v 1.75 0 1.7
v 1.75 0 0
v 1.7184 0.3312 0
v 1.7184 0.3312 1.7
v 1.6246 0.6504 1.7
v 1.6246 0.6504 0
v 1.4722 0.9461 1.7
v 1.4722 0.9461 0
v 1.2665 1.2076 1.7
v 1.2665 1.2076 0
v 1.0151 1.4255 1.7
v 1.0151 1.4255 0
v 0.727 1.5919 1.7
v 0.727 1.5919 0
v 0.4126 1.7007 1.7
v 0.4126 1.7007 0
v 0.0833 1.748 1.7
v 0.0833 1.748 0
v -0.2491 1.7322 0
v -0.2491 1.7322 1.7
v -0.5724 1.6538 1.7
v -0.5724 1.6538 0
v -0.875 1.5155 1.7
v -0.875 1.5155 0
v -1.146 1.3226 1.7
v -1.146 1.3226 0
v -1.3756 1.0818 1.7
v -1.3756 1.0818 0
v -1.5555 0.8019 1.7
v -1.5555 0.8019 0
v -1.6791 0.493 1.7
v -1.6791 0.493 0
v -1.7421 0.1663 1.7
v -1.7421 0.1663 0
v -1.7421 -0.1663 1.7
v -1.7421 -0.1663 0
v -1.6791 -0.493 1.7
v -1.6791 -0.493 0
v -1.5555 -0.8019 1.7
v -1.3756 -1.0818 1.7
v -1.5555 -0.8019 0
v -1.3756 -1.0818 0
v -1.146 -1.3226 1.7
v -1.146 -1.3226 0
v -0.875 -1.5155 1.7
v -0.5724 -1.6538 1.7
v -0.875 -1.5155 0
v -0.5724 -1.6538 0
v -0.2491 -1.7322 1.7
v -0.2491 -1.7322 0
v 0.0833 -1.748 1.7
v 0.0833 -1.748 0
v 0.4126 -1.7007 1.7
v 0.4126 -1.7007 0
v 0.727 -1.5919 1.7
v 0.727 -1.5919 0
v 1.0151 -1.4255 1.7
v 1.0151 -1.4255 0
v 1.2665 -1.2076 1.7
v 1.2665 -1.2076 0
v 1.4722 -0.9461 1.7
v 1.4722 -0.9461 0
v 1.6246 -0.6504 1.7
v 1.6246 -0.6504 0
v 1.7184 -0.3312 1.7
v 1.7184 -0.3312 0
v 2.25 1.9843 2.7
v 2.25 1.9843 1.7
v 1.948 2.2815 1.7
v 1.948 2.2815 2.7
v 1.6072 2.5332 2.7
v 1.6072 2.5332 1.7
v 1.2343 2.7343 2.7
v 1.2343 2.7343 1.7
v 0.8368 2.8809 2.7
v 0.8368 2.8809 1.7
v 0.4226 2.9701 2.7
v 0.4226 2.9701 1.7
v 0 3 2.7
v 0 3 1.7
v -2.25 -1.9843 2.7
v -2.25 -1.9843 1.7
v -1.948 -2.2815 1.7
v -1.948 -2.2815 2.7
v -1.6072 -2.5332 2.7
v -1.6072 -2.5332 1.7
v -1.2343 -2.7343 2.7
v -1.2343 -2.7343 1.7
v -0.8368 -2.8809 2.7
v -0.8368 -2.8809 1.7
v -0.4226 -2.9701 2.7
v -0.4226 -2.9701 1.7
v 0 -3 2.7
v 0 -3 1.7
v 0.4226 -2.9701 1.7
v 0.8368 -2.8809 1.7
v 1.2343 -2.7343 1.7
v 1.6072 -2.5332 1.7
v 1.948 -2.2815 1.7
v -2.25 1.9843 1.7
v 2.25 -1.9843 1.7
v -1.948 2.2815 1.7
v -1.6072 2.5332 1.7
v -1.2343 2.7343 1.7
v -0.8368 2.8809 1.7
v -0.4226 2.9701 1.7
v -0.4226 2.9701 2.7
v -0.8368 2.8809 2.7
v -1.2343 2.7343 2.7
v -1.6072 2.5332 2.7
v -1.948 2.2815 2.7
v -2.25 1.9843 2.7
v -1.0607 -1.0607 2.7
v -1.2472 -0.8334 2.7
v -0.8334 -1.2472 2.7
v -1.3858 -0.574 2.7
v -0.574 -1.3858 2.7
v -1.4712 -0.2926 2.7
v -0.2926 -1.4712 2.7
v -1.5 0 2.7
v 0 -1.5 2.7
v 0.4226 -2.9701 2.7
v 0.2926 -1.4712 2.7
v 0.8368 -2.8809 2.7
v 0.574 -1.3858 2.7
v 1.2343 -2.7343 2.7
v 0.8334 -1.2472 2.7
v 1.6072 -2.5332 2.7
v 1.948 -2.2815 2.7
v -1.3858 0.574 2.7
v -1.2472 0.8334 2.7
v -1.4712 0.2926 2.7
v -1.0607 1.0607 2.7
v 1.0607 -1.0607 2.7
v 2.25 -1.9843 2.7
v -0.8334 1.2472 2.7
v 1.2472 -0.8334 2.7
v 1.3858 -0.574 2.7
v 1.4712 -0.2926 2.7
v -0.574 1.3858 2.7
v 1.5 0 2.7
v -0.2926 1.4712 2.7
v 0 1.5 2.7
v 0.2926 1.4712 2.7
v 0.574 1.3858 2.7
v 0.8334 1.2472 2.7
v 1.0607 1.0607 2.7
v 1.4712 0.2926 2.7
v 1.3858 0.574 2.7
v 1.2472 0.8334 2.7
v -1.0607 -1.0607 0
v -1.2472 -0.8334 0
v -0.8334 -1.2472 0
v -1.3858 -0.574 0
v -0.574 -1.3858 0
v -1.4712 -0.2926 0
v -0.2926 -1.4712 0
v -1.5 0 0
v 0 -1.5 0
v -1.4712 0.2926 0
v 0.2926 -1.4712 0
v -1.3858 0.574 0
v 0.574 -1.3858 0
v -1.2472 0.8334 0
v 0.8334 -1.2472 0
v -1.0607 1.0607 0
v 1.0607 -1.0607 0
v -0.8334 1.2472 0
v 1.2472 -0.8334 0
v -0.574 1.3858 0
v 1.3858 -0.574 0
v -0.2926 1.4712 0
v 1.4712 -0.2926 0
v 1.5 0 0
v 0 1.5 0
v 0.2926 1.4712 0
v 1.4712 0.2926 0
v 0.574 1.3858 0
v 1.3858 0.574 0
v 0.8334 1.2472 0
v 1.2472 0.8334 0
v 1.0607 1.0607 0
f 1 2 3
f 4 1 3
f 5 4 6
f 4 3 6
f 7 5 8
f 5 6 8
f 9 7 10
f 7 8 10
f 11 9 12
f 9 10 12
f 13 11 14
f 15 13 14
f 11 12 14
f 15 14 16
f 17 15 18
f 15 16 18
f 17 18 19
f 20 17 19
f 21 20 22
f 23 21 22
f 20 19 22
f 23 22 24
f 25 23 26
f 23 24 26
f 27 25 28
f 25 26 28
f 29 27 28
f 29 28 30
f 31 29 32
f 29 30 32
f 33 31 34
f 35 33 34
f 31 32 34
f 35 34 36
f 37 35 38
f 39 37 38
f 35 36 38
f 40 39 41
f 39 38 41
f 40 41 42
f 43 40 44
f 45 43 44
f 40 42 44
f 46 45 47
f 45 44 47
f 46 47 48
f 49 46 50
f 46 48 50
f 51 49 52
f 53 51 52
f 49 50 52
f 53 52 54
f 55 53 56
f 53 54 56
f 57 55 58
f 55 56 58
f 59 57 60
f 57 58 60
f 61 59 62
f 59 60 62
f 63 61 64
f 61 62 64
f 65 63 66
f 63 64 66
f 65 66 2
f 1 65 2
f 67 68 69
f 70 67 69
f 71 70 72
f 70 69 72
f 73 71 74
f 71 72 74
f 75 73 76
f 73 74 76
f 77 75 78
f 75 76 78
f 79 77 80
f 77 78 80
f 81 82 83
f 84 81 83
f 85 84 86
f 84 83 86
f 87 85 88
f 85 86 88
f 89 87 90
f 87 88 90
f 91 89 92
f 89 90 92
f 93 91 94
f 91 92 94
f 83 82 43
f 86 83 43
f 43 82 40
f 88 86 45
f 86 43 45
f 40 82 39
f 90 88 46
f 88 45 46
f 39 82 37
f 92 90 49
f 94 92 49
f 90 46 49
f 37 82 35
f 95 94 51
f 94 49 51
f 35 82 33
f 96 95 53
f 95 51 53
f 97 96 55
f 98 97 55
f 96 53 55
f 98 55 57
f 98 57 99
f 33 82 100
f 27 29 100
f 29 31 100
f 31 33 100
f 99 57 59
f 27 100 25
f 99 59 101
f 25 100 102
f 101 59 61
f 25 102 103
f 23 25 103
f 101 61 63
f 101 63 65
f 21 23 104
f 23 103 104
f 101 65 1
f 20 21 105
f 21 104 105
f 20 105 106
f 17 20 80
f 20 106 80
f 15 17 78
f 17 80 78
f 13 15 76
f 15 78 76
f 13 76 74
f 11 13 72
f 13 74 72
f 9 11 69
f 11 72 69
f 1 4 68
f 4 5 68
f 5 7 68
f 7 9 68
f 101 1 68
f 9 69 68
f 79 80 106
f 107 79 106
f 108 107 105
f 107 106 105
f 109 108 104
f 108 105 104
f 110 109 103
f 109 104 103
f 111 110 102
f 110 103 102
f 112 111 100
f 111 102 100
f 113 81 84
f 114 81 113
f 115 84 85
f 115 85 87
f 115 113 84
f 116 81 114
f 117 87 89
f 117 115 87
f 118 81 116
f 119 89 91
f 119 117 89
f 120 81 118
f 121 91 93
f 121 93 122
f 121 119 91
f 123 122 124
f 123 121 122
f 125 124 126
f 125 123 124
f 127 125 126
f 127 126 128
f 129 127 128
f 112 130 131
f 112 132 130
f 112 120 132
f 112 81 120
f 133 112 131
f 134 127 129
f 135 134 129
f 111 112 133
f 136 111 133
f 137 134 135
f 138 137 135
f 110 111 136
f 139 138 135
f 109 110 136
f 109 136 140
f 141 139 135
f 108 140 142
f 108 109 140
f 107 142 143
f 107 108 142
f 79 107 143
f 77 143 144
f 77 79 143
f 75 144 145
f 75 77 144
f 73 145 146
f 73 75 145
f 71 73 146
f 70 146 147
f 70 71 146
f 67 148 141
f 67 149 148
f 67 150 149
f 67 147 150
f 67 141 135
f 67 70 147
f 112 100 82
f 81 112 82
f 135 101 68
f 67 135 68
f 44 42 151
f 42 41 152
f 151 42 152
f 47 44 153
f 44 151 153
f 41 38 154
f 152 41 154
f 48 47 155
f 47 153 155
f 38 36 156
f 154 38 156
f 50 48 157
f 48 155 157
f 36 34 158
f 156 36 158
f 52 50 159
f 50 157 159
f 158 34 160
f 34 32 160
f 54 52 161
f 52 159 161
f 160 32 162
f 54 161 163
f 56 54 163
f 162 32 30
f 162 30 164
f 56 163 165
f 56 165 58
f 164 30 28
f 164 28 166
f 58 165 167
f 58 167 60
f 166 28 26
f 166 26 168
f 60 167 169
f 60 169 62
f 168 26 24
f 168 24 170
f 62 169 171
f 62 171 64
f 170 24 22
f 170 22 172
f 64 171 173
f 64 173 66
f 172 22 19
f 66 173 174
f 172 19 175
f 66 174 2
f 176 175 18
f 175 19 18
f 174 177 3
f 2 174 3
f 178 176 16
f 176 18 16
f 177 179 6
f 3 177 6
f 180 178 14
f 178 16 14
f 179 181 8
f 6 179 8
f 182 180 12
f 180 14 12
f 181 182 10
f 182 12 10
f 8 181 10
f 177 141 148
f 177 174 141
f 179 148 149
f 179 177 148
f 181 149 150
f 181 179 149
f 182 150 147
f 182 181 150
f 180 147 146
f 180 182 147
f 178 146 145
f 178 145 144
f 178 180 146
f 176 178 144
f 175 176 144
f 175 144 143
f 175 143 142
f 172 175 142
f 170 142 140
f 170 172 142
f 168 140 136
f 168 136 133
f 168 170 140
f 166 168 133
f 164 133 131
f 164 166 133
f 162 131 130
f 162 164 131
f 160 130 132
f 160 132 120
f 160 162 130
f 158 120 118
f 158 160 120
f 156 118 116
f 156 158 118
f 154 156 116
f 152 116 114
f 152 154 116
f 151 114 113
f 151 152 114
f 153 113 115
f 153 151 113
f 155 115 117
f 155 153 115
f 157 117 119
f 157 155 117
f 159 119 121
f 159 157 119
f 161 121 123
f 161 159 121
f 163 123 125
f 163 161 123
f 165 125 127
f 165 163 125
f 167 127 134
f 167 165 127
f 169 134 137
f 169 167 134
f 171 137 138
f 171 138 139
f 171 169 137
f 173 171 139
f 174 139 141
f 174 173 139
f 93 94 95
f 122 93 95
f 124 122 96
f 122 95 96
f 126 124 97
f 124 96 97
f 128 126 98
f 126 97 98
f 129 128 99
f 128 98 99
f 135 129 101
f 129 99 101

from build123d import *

# Parameters (mm, degrees)
SKETCH_1_R      = 1.75
SKETCH_1_R_2    = 1.5
EXTRUDE_1_DEPTH = 1.7
SKETCH_2_R      = 1.75
SKETCH_2_R_2    = 1.5
EXTRUDE_2_DEPTH = 1


with BuildPart() as part:
    # 草图1 → 凸台-拉伸1 (new body)
    with BuildSketch(Plane.XY):
        Circle(SKETCH_1_R)
        Circle(SKETCH_1_R_2, mode=Mode.SUBTRACT)
    extrude(amount=EXTRUDE_1_DEPTH)

    # 草图2 → 凸台-拉伸2 (add)
    # profile 1 of 2: a face of its own
    with BuildSketch(Plane.XY.offset(1.7)):
        with BuildLine():
            ThreePointArc((-2.25, -1.984313483), (-1.234313483, -2.734313483), (0, -3))
            ThreePointArc((0, -3), (1.234313483, -2.734313483), (2.25, -1.984313483))
            Line((2.25, -1.984313483), (2.25, 1.984313483))
            ThreePointArc((2.25, 1.984313483), (1.234313483, 2.734313483), (0, 3))
            ThreePointArc((0, 3), (-1.234313483, 2.734313483), (-2.25, 1.984313483))
            Line((-2.25, 1.984313483), (-2.25, -1.984313483))
        make_face()
        Circle(SKETCH_2_R, mode=Mode.SUBTRACT)
    # profile 2 of 2: a face of its own
    with BuildSketch(Plane.XY.offset(1.7)):
        Circle(SKETCH_2_R)
        Circle(SKETCH_2_R_2, mode=Mode.SUBTRACT)
    extrude(amount=EXTRUDE_2_DEPTH)


solid = part.part
